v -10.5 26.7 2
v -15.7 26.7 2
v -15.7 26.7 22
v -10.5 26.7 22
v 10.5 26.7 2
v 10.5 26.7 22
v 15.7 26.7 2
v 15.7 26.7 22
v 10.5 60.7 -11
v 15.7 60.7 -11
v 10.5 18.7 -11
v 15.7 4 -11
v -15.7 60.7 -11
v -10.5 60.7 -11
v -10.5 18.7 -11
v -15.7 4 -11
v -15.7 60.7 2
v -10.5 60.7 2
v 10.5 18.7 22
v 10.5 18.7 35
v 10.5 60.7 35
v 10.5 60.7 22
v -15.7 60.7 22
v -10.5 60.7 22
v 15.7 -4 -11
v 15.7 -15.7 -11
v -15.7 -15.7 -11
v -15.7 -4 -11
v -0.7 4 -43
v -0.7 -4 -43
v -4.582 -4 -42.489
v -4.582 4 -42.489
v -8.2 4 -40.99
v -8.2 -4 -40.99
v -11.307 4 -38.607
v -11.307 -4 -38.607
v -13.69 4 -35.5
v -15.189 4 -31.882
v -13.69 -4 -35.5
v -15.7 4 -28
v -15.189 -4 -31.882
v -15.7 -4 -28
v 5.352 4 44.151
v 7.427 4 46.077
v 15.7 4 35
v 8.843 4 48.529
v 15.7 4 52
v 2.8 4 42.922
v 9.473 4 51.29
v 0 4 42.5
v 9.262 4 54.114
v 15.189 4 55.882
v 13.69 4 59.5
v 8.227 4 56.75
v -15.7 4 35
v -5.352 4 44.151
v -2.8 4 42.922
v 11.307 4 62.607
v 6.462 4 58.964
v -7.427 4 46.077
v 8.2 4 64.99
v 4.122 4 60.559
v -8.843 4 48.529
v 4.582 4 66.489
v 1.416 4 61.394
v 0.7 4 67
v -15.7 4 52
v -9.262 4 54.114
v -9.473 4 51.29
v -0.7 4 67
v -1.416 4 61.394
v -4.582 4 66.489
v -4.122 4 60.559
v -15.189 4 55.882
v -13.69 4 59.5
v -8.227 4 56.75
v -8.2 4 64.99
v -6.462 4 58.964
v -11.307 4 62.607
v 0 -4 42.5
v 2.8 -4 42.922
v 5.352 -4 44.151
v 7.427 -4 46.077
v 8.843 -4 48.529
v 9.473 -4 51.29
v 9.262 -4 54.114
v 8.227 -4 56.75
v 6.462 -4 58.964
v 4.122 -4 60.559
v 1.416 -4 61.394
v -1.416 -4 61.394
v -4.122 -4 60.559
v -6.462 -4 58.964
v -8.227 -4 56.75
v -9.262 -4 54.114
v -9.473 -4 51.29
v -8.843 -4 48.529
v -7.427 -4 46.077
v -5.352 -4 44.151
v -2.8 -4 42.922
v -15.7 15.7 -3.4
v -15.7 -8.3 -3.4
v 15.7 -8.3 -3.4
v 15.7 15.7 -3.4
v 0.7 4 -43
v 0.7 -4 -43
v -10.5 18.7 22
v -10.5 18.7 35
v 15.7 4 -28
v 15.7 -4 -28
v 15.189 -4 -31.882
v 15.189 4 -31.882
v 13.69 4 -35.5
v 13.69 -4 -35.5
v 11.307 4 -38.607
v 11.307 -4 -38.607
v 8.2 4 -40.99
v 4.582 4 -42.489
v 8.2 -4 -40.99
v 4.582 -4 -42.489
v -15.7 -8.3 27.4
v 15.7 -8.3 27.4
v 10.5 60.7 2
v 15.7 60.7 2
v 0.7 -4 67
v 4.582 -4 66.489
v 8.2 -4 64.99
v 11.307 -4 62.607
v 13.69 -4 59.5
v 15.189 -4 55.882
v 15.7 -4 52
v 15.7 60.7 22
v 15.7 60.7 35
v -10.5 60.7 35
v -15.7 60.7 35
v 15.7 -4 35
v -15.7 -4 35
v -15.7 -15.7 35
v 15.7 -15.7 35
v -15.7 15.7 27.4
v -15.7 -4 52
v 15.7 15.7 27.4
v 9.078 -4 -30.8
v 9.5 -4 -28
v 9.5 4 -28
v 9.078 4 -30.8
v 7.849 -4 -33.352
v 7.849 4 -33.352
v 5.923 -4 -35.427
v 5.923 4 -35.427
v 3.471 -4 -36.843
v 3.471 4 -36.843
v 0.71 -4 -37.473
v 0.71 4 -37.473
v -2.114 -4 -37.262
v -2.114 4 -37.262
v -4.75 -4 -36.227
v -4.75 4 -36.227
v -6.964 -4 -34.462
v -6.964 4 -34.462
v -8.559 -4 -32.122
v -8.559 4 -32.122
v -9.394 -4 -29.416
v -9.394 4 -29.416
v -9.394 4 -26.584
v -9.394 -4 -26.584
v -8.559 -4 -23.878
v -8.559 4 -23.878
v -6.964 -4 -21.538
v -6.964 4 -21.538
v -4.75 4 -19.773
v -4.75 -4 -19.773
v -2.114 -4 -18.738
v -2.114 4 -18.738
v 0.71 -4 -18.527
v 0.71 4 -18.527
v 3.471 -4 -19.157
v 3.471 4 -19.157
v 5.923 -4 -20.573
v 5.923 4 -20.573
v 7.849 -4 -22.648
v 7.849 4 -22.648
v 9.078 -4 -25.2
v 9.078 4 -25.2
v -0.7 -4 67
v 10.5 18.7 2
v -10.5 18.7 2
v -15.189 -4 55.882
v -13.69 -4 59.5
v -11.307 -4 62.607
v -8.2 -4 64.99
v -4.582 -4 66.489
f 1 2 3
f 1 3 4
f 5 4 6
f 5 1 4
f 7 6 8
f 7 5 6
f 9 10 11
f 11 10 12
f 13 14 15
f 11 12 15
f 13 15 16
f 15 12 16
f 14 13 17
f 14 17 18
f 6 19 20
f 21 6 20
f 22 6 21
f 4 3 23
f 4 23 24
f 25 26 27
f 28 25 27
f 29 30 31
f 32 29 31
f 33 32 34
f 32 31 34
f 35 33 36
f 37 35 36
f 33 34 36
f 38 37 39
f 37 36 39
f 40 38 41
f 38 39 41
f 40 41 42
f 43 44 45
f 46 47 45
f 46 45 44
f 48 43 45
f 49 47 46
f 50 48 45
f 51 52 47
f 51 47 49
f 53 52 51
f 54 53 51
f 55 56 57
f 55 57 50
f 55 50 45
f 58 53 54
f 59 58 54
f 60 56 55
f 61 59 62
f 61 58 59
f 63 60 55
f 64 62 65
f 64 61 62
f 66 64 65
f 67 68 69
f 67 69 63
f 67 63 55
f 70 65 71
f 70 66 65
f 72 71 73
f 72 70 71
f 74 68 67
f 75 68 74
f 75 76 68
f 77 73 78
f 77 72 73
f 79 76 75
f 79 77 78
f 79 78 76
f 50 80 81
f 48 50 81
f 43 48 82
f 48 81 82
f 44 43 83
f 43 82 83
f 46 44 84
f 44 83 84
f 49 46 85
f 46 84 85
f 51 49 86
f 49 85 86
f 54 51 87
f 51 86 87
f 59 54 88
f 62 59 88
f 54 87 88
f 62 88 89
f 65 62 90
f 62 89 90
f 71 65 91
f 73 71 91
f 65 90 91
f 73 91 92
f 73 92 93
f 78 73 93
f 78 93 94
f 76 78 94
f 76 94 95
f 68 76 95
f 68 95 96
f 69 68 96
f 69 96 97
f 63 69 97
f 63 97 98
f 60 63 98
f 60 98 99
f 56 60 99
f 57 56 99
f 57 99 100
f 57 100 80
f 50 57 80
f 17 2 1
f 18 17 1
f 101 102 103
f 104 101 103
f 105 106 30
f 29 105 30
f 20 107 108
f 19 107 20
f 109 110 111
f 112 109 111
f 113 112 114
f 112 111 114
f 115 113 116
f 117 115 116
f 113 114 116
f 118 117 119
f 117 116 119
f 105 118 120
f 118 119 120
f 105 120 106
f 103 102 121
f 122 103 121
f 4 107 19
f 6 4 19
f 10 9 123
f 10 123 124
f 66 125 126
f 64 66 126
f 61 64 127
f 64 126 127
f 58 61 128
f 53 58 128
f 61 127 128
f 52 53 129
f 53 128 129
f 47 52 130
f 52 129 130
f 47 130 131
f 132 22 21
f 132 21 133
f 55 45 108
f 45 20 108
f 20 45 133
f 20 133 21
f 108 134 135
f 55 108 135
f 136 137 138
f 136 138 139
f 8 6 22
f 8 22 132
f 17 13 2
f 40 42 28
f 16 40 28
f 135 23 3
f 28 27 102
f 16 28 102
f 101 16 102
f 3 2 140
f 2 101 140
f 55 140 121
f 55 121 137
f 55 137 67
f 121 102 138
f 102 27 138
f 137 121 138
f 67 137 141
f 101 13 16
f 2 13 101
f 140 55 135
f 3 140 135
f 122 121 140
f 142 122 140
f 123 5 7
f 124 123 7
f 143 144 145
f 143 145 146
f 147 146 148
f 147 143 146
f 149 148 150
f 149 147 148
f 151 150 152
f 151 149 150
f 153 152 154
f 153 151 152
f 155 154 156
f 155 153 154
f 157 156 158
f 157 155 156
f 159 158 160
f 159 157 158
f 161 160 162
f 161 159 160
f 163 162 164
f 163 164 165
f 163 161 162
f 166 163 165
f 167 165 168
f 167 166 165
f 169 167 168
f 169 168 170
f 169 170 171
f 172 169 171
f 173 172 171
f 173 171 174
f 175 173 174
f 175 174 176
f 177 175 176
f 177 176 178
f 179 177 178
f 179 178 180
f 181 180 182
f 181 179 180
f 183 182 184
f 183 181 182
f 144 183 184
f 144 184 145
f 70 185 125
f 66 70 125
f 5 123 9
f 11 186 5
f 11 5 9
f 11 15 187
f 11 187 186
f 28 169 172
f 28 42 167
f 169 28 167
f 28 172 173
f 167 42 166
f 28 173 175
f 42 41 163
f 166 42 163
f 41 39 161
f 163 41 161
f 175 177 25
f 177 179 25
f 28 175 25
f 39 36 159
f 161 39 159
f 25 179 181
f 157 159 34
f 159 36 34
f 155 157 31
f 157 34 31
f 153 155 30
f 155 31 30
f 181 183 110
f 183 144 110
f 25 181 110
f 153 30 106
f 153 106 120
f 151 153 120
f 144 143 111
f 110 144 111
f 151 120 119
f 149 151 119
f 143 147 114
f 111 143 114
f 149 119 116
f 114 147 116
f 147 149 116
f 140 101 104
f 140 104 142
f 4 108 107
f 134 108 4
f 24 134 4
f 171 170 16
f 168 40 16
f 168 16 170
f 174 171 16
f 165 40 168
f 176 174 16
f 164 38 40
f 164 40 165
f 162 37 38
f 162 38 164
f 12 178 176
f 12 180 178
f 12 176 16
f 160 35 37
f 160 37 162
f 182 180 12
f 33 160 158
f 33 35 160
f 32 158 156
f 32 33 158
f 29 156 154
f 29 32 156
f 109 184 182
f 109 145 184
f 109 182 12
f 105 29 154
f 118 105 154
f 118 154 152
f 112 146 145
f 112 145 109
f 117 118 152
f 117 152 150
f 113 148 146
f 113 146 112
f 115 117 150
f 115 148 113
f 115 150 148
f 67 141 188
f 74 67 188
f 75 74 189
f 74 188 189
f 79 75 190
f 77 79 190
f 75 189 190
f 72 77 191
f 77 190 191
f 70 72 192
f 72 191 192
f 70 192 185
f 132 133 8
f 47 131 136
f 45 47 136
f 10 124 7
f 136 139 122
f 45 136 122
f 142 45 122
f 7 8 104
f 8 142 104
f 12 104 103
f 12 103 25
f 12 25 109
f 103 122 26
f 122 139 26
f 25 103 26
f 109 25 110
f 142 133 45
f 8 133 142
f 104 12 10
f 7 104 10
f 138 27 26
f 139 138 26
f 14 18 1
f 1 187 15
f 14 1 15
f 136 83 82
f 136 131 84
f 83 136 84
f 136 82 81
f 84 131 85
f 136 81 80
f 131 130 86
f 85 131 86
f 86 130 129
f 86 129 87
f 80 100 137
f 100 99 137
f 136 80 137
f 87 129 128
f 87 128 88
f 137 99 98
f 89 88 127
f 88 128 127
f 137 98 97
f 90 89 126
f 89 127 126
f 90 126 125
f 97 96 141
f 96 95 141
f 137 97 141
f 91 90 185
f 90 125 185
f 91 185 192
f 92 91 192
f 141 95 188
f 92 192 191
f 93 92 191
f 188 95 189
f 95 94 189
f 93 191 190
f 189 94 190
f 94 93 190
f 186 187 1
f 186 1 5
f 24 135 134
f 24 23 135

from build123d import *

# Parameters (mm, degrees)
SKETCH4_W             = 31.4
SKETCH4_H             = 31.4
SKETCH4_W_2           = 25.4
SKETCH4_H_2           = 25.4
BOSS_EXTRUDE3_DEPTH   = 30
SKETCH5_W             = 31.4
SKETCH5_H             = 31.4
BOSS_EXTRUDE4_DEPTH   = 5
SKETCH6_W             = 31.4
SKETCH6_H             = 8
BOSS_EXTRUDE5_DEPTH   = 5
BOSS_EXTRUDE6_DEPTH   = 8
SKETCH8_R             = 9.5
BOSS_EXTRUDE7_DEPTH   = 8
SKETCH9_W             = 31.4
SKETCH9_H             = 10
BOSS_EXTRUDE8_DEPTH   = 5
SKETCH10_W            = 31.4
SKETCH10_H            = 10
BOSS_EXTRUDE9_DEPTH   = 11
SKETCH11_W            = 5.2
SKETCH11_H            = 10
BOSS_EXTRUDE10_DEPTH  = 40
BOSS_EXTRUDE11_DEPTH  = 3
SKETCH13_W            = 31.4
SKETCH13_H            = 31.4
CUT_EXTRUDE1_DEPTH    = 31.4
SKETCH14_W            = 31.4
SKETCH14_H            = 31.4
BOSS_EXTRUDE12_DEPTH  = 4
SKETCH16_W            = 31.4
SKETCH16_H            = 8
BOSS_EXTRUDE13_DEPTH  = 15.4
CUT_EXTRUDE3_START    = 8
SKETCH8_2_R           = 9.5
CUT_EXTRUDE3_DEPTH    = 24
SKETCH18_W            = 21
SKETCH18_H            = 13
CUT_EXTRUDE4_DEPTH    = 2
MIRROR2_START         = -15.7
MIRROR2_DEPTH         = 34.4
MIRROR2_START_2       = 12.7
MIRROR2_2_OUTLINE_W   = 5.2
MIRROR2_2_OUTLINE_H   = 13
MIRROR2_2_DEPTH       = 48
MIRROR2_START_3       = -4
MIRROR2_3_OUTLINE_R   = 9.5
MIRROR2_3_DEPTH       = 8
MIRROR2_4_OUTLINE_W   = 31.4
MIRROR2_4_OUTLINE_H   = 10
MIRROR2_4_DEPTH       = 14
MIRROR2_5_OUTLINE_W   = 25.4
MIRROR2_5_OUTLINE_H   = 15.4
MIRROR2_5_DEPTH       = 8
MIRROR2_6_OUTLINE_W   = 21
MIRROR2_6_OUTLINE_H   = 5.4
MIRROR2_6_OUTLINE_W_2 = 25.4
MIRROR2_6_OUTLINE_H_2 = 12
MIRROR2_6_DEPTH       = 6
SKETCH17_W            = 30.8
SKETCH17_H            = 24
CUT_EXTRUDE2_DEPTH    = 31.4


# Read off the part's stored shape, not the designer's step: Mirror2
with BuildPart() as part:
    # Sketch4 → Boss-Extrude3 (new body)
    with BuildSketch(Plane.XY):
        Rectangle(SKETCH4_W, SKETCH4_H)
        Rectangle(SKETCH4_W_2, SKETCH4_H_2, mode=Mode.SUBTRACT)
    extrude(amount=BOSS_EXTRUDE3_DEPTH)

    # Sketch5 → Boss-Extrude4 (add)
    with BuildSketch(Plane.XY.offset(30)):
        Rectangle(SKETCH5_W, SKETCH5_H)
    extrude(amount=BOSS_EXTRUDE4_DEPTH)

    # Sketch6 → Boss-Extrude5 (add)
    with BuildSketch(Plane.XY.offset(35)):
        Rectangle(SKETCH6_W, SKETCH6_H)
    extrude(amount=BOSS_EXTRUDE5_DEPTH)

    # Sketch7 → Boss-Extrude6 (add)
    with BuildSketch(Plane.XZ.offset(4)):
        with BuildLine():
            Line((-15.7, 40), (-15.7, 52))
            ThreePointArc((-15.7, 52), (-11.306601718, 62.606601718), (-0.7, 67))
            Line((-0.7, 67), (0.7, 67))
            ThreePointArc((0.7, 67), (11.306601718, 62.606601718), (15.7, 52))
            Line((15.7, 52), (15.7, 40))
            Line((15.7, 40), (-15.7, 40))
        make_face()
    extrude(amount=-BOSS_EXTRUDE6_DEPTH)

    # Sketch8 → Boss-Extrude7 (add)
    with BuildSketch(Plane.XZ.offset(4)):
        with Locations(Location((0, 52, 0), (0, 0, 180))):
            Circle(SKETCH8_R)
    boss_extrude7 = extrude(amount=BOSS_EXTRUDE7_DEPTH)

    # Mirror1: Boss-Extrude7 across plane
    add(boss_extrude7.mirror(Plane.ZX))

    # Sketch9 → Boss-Extrude8 (add)
    with BuildSketch(Plane(origin=(0, 15.7, 0), x_dir=(1, 0, 0), z_dir=(0, 1, 0))):
        with Locations((0, -27)):
            Rectangle(SKETCH9_W, SKETCH9_H)
    extrude(amount=BOSS_EXTRUDE8_DEPTH)

    # Sketch10 → Boss-Extrude9 (add)
    with BuildSketch(Plane(origin=(0, 15.7, 0), x_dir=(1, 0, 0), z_dir=(0, 1, 0))):
        with Locations((0, -17)):
            Rectangle(SKETCH10_W, SKETCH10_H)
    extrude(amount=BOSS_EXTRUDE9_DEPTH)

    # Sketch11 → Boss-Extrude10 (add)
    with BuildSketch(Plane(origin=(0, 20.7, 0), x_dir=(1, 0, 0), z_dir=(0, 1, 0))):
        with Locations((-13.1, -27)):
            Rectangle(SKETCH11_W, SKETCH11_H)
        with Locations((13.1, -27)):
            Rectangle(SKETCH11_W, SKETCH11_H)
    extrude(amount=BOSS_EXTRUDE10_DEPTH)

    # Sketch12 → Boss-Extrude11 (add)
    with BuildSketch(Plane.XY.offset(32)):
        Polygon((-15.7, 60.7), (-10.5, 60.7), (-10.5, 20.7), (10.5, 20.7), (10.5, 60.7), (15.7, 60.7), (15.7, 15.7), (-15.7, 15.7), align=None)
    extrude(amount=BOSS_EXTRUDE11_DEPTH)

    # Sketch13 → Cut-Extrude1 (cut)
    with BuildSketch(Plane.ZY.offset(15.7)):
        with Locations((15.7, 0)):
            Rectangle(SKETCH13_W, SKETCH13_H)
    extrude(amount=-CUT_EXTRUDE1_DEPTH, mode=Mode.SUBTRACT)

    # Sketch14 → Boss-Extrude12 (add)
    with BuildSketch(Plane(origin=(0, 0, 31.4), x_dir=(-1, 0, 0), z_dir=(0, 0, -1))):
        Rectangle(SKETCH14_W, SKETCH14_H)
    extrude(amount=BOSS_EXTRUDE12_DEPTH)

    # Sketch16 → Boss-Extrude13 (add)
    with BuildSketch(Plane(origin=(0, 0, 27.4), x_dir=(-1, 0, 0), z_dir=(0, 0, -1))):
        with Locations((0, -11.7)):
            Rectangle(SKETCH16_W, SKETCH16_H)
    extrude(amount=BOSS_EXTRUDE13_DEPTH)

    # Sketch8<2> → Cut-Extrude3 (cut)
    with BuildSketch(Plane.XZ.offset(4).offset(CUT_EXTRUDE3_START)):
        with Locations(Location((0, 52, 0), (0, 0, 270))):
            Circle(SKETCH8_2_R)
    extrude(amount=-CUT_EXTRUDE3_DEPTH, mode=Mode.SUBTRACT)

    # Sketch18 → Cut-Extrude4 (cut)
    with BuildSketch(Plane(origin=(0, 20.7, 0), x_dir=(1, 0, 0), z_dir=(0, 1, 0))):
        with Locations((0, -28.5)):
            Rectangle(SKETCH18_W, SKETCH18_H)
    extrude(amount=-CUT_EXTRUDE4_DEPTH, mode=Mode.SUBTRACT)

    # Mirror2 outline → Mirror2 (add)
    with BuildSketch(Plane(origin=(0, 0, 0), x_dir=(1, 0, 0), z_dir=(0, 1, 0)).offset(MIRROR2_START)):
        Polygon((-15.7, 11), (-15.7, -24), (-12.7, -24), (-12.7, 3.4), (12.7, 3.4), (12.7, -24), (15.7, -24), (15.7, 11), align=None)
    extrude(amount=MIRROR2_DEPTH)

    # Mirror2 2 outline → Mirror2 2 (add)
    with BuildSketch(Plane(origin=(0, 0, 0), x_dir=(1, 0, 0), z_dir=(0, 1, 0)).offset(MIRROR2_START_2)):
        with Locations((-13.1, 4.5)):
            Rectangle(MIRROR2_2_OUTLINE_W, MIRROR2_2_OUTLINE_H)
        with Locations((13.1, 4.5)):
            Rectangle(MIRROR2_2_OUTLINE_W, MIRROR2_2_OUTLINE_H)
    extrude(amount=MIRROR2_2_DEPTH)

    # Mirror2 3 outline → Mirror2 3 (add)
    with BuildSketch(Plane(origin=(0, 0, 0), x_dir=(1, 0, 0), z_dir=(0, 1, 0)).offset(MIRROR2_START_3)):
        with BuildLine():
            Line((-15.7, 28), (-15.7, 11))
            Line((-15.7, 11), (15.7, 11))
            Line((15.7, 11), (15.7, 28))
            ThreePointArc((15.7, 28), (11.306601718, 38.606601718), (0.7, 43))
            Line((0.7, 43), (-0.7, 43))
            ThreePointArc((-0.7, 43), (-11.306601718, 38.606601718), (-15.7, 28))
        make_face()
        with Locations((0, 28)):
            Circle(MIRROR2_3_OUTLINE_R, mode=Mode.SUBTRACT)
    extrude(amount=MIRROR2_3_DEPTH)

    # Mirror2 4 outline → Mirror2 4 (add)
    with BuildSketch(Plane(origin=(0, 0, 0), x_dir=(1, 0, 0), z_dir=(0, 1, 0)).offset(MIRROR2_START_2)):
        with Locations((0, -7)):
            Rectangle(MIRROR2_4_OUTLINE_W, MIRROR2_4_OUTLINE_H)
    extrude(amount=MIRROR2_4_DEPTH)

    # Mirror2 5 outline → Mirror2 5 (add)
    with BuildSketch(Plane(origin=(0, 0, 0), x_dir=(1, 0, 0), z_dir=(0, 1, 0)).offset(MIRROR2_START)):
        with Locations((0, -4.3)):
            Rectangle(MIRROR2_5_OUTLINE_W, MIRROR2_5_OUTLINE_H)
    extrude(amount=MIRROR2_5_DEPTH)

    # Mirror2 6 outline → Mirror2 6 (add)
    with BuildSketch(Plane(origin=(0, 0, 0), x_dir=(1, 0, 0), z_dir=(0, 1, 0)).offset(MIRROR2_START_2)):
        with Locations((0, 0.7)):
            Rectangle(MIRROR2_6_OUTLINE_W, MIRROR2_6_OUTLINE_H)
        with Locations((0, -18)):
            Rectangle(MIRROR2_6_OUTLINE_W_2, MIRROR2_6_OUTLINE_H_2)
    extrude(amount=MIRROR2_6_DEPTH)

    # Sketch17 → Cut-Extrude2 (cut)
    with BuildSketch(Plane.ZY.offset(15.7)):
        with Locations((12, 3.7)):
            Rectangle(SKETCH17_W, SKETCH17_H)
    extrude(amount=-CUT_EXTRUDE2_DEPTH, mode=Mode.SUBTRACT)


solid = part.part
